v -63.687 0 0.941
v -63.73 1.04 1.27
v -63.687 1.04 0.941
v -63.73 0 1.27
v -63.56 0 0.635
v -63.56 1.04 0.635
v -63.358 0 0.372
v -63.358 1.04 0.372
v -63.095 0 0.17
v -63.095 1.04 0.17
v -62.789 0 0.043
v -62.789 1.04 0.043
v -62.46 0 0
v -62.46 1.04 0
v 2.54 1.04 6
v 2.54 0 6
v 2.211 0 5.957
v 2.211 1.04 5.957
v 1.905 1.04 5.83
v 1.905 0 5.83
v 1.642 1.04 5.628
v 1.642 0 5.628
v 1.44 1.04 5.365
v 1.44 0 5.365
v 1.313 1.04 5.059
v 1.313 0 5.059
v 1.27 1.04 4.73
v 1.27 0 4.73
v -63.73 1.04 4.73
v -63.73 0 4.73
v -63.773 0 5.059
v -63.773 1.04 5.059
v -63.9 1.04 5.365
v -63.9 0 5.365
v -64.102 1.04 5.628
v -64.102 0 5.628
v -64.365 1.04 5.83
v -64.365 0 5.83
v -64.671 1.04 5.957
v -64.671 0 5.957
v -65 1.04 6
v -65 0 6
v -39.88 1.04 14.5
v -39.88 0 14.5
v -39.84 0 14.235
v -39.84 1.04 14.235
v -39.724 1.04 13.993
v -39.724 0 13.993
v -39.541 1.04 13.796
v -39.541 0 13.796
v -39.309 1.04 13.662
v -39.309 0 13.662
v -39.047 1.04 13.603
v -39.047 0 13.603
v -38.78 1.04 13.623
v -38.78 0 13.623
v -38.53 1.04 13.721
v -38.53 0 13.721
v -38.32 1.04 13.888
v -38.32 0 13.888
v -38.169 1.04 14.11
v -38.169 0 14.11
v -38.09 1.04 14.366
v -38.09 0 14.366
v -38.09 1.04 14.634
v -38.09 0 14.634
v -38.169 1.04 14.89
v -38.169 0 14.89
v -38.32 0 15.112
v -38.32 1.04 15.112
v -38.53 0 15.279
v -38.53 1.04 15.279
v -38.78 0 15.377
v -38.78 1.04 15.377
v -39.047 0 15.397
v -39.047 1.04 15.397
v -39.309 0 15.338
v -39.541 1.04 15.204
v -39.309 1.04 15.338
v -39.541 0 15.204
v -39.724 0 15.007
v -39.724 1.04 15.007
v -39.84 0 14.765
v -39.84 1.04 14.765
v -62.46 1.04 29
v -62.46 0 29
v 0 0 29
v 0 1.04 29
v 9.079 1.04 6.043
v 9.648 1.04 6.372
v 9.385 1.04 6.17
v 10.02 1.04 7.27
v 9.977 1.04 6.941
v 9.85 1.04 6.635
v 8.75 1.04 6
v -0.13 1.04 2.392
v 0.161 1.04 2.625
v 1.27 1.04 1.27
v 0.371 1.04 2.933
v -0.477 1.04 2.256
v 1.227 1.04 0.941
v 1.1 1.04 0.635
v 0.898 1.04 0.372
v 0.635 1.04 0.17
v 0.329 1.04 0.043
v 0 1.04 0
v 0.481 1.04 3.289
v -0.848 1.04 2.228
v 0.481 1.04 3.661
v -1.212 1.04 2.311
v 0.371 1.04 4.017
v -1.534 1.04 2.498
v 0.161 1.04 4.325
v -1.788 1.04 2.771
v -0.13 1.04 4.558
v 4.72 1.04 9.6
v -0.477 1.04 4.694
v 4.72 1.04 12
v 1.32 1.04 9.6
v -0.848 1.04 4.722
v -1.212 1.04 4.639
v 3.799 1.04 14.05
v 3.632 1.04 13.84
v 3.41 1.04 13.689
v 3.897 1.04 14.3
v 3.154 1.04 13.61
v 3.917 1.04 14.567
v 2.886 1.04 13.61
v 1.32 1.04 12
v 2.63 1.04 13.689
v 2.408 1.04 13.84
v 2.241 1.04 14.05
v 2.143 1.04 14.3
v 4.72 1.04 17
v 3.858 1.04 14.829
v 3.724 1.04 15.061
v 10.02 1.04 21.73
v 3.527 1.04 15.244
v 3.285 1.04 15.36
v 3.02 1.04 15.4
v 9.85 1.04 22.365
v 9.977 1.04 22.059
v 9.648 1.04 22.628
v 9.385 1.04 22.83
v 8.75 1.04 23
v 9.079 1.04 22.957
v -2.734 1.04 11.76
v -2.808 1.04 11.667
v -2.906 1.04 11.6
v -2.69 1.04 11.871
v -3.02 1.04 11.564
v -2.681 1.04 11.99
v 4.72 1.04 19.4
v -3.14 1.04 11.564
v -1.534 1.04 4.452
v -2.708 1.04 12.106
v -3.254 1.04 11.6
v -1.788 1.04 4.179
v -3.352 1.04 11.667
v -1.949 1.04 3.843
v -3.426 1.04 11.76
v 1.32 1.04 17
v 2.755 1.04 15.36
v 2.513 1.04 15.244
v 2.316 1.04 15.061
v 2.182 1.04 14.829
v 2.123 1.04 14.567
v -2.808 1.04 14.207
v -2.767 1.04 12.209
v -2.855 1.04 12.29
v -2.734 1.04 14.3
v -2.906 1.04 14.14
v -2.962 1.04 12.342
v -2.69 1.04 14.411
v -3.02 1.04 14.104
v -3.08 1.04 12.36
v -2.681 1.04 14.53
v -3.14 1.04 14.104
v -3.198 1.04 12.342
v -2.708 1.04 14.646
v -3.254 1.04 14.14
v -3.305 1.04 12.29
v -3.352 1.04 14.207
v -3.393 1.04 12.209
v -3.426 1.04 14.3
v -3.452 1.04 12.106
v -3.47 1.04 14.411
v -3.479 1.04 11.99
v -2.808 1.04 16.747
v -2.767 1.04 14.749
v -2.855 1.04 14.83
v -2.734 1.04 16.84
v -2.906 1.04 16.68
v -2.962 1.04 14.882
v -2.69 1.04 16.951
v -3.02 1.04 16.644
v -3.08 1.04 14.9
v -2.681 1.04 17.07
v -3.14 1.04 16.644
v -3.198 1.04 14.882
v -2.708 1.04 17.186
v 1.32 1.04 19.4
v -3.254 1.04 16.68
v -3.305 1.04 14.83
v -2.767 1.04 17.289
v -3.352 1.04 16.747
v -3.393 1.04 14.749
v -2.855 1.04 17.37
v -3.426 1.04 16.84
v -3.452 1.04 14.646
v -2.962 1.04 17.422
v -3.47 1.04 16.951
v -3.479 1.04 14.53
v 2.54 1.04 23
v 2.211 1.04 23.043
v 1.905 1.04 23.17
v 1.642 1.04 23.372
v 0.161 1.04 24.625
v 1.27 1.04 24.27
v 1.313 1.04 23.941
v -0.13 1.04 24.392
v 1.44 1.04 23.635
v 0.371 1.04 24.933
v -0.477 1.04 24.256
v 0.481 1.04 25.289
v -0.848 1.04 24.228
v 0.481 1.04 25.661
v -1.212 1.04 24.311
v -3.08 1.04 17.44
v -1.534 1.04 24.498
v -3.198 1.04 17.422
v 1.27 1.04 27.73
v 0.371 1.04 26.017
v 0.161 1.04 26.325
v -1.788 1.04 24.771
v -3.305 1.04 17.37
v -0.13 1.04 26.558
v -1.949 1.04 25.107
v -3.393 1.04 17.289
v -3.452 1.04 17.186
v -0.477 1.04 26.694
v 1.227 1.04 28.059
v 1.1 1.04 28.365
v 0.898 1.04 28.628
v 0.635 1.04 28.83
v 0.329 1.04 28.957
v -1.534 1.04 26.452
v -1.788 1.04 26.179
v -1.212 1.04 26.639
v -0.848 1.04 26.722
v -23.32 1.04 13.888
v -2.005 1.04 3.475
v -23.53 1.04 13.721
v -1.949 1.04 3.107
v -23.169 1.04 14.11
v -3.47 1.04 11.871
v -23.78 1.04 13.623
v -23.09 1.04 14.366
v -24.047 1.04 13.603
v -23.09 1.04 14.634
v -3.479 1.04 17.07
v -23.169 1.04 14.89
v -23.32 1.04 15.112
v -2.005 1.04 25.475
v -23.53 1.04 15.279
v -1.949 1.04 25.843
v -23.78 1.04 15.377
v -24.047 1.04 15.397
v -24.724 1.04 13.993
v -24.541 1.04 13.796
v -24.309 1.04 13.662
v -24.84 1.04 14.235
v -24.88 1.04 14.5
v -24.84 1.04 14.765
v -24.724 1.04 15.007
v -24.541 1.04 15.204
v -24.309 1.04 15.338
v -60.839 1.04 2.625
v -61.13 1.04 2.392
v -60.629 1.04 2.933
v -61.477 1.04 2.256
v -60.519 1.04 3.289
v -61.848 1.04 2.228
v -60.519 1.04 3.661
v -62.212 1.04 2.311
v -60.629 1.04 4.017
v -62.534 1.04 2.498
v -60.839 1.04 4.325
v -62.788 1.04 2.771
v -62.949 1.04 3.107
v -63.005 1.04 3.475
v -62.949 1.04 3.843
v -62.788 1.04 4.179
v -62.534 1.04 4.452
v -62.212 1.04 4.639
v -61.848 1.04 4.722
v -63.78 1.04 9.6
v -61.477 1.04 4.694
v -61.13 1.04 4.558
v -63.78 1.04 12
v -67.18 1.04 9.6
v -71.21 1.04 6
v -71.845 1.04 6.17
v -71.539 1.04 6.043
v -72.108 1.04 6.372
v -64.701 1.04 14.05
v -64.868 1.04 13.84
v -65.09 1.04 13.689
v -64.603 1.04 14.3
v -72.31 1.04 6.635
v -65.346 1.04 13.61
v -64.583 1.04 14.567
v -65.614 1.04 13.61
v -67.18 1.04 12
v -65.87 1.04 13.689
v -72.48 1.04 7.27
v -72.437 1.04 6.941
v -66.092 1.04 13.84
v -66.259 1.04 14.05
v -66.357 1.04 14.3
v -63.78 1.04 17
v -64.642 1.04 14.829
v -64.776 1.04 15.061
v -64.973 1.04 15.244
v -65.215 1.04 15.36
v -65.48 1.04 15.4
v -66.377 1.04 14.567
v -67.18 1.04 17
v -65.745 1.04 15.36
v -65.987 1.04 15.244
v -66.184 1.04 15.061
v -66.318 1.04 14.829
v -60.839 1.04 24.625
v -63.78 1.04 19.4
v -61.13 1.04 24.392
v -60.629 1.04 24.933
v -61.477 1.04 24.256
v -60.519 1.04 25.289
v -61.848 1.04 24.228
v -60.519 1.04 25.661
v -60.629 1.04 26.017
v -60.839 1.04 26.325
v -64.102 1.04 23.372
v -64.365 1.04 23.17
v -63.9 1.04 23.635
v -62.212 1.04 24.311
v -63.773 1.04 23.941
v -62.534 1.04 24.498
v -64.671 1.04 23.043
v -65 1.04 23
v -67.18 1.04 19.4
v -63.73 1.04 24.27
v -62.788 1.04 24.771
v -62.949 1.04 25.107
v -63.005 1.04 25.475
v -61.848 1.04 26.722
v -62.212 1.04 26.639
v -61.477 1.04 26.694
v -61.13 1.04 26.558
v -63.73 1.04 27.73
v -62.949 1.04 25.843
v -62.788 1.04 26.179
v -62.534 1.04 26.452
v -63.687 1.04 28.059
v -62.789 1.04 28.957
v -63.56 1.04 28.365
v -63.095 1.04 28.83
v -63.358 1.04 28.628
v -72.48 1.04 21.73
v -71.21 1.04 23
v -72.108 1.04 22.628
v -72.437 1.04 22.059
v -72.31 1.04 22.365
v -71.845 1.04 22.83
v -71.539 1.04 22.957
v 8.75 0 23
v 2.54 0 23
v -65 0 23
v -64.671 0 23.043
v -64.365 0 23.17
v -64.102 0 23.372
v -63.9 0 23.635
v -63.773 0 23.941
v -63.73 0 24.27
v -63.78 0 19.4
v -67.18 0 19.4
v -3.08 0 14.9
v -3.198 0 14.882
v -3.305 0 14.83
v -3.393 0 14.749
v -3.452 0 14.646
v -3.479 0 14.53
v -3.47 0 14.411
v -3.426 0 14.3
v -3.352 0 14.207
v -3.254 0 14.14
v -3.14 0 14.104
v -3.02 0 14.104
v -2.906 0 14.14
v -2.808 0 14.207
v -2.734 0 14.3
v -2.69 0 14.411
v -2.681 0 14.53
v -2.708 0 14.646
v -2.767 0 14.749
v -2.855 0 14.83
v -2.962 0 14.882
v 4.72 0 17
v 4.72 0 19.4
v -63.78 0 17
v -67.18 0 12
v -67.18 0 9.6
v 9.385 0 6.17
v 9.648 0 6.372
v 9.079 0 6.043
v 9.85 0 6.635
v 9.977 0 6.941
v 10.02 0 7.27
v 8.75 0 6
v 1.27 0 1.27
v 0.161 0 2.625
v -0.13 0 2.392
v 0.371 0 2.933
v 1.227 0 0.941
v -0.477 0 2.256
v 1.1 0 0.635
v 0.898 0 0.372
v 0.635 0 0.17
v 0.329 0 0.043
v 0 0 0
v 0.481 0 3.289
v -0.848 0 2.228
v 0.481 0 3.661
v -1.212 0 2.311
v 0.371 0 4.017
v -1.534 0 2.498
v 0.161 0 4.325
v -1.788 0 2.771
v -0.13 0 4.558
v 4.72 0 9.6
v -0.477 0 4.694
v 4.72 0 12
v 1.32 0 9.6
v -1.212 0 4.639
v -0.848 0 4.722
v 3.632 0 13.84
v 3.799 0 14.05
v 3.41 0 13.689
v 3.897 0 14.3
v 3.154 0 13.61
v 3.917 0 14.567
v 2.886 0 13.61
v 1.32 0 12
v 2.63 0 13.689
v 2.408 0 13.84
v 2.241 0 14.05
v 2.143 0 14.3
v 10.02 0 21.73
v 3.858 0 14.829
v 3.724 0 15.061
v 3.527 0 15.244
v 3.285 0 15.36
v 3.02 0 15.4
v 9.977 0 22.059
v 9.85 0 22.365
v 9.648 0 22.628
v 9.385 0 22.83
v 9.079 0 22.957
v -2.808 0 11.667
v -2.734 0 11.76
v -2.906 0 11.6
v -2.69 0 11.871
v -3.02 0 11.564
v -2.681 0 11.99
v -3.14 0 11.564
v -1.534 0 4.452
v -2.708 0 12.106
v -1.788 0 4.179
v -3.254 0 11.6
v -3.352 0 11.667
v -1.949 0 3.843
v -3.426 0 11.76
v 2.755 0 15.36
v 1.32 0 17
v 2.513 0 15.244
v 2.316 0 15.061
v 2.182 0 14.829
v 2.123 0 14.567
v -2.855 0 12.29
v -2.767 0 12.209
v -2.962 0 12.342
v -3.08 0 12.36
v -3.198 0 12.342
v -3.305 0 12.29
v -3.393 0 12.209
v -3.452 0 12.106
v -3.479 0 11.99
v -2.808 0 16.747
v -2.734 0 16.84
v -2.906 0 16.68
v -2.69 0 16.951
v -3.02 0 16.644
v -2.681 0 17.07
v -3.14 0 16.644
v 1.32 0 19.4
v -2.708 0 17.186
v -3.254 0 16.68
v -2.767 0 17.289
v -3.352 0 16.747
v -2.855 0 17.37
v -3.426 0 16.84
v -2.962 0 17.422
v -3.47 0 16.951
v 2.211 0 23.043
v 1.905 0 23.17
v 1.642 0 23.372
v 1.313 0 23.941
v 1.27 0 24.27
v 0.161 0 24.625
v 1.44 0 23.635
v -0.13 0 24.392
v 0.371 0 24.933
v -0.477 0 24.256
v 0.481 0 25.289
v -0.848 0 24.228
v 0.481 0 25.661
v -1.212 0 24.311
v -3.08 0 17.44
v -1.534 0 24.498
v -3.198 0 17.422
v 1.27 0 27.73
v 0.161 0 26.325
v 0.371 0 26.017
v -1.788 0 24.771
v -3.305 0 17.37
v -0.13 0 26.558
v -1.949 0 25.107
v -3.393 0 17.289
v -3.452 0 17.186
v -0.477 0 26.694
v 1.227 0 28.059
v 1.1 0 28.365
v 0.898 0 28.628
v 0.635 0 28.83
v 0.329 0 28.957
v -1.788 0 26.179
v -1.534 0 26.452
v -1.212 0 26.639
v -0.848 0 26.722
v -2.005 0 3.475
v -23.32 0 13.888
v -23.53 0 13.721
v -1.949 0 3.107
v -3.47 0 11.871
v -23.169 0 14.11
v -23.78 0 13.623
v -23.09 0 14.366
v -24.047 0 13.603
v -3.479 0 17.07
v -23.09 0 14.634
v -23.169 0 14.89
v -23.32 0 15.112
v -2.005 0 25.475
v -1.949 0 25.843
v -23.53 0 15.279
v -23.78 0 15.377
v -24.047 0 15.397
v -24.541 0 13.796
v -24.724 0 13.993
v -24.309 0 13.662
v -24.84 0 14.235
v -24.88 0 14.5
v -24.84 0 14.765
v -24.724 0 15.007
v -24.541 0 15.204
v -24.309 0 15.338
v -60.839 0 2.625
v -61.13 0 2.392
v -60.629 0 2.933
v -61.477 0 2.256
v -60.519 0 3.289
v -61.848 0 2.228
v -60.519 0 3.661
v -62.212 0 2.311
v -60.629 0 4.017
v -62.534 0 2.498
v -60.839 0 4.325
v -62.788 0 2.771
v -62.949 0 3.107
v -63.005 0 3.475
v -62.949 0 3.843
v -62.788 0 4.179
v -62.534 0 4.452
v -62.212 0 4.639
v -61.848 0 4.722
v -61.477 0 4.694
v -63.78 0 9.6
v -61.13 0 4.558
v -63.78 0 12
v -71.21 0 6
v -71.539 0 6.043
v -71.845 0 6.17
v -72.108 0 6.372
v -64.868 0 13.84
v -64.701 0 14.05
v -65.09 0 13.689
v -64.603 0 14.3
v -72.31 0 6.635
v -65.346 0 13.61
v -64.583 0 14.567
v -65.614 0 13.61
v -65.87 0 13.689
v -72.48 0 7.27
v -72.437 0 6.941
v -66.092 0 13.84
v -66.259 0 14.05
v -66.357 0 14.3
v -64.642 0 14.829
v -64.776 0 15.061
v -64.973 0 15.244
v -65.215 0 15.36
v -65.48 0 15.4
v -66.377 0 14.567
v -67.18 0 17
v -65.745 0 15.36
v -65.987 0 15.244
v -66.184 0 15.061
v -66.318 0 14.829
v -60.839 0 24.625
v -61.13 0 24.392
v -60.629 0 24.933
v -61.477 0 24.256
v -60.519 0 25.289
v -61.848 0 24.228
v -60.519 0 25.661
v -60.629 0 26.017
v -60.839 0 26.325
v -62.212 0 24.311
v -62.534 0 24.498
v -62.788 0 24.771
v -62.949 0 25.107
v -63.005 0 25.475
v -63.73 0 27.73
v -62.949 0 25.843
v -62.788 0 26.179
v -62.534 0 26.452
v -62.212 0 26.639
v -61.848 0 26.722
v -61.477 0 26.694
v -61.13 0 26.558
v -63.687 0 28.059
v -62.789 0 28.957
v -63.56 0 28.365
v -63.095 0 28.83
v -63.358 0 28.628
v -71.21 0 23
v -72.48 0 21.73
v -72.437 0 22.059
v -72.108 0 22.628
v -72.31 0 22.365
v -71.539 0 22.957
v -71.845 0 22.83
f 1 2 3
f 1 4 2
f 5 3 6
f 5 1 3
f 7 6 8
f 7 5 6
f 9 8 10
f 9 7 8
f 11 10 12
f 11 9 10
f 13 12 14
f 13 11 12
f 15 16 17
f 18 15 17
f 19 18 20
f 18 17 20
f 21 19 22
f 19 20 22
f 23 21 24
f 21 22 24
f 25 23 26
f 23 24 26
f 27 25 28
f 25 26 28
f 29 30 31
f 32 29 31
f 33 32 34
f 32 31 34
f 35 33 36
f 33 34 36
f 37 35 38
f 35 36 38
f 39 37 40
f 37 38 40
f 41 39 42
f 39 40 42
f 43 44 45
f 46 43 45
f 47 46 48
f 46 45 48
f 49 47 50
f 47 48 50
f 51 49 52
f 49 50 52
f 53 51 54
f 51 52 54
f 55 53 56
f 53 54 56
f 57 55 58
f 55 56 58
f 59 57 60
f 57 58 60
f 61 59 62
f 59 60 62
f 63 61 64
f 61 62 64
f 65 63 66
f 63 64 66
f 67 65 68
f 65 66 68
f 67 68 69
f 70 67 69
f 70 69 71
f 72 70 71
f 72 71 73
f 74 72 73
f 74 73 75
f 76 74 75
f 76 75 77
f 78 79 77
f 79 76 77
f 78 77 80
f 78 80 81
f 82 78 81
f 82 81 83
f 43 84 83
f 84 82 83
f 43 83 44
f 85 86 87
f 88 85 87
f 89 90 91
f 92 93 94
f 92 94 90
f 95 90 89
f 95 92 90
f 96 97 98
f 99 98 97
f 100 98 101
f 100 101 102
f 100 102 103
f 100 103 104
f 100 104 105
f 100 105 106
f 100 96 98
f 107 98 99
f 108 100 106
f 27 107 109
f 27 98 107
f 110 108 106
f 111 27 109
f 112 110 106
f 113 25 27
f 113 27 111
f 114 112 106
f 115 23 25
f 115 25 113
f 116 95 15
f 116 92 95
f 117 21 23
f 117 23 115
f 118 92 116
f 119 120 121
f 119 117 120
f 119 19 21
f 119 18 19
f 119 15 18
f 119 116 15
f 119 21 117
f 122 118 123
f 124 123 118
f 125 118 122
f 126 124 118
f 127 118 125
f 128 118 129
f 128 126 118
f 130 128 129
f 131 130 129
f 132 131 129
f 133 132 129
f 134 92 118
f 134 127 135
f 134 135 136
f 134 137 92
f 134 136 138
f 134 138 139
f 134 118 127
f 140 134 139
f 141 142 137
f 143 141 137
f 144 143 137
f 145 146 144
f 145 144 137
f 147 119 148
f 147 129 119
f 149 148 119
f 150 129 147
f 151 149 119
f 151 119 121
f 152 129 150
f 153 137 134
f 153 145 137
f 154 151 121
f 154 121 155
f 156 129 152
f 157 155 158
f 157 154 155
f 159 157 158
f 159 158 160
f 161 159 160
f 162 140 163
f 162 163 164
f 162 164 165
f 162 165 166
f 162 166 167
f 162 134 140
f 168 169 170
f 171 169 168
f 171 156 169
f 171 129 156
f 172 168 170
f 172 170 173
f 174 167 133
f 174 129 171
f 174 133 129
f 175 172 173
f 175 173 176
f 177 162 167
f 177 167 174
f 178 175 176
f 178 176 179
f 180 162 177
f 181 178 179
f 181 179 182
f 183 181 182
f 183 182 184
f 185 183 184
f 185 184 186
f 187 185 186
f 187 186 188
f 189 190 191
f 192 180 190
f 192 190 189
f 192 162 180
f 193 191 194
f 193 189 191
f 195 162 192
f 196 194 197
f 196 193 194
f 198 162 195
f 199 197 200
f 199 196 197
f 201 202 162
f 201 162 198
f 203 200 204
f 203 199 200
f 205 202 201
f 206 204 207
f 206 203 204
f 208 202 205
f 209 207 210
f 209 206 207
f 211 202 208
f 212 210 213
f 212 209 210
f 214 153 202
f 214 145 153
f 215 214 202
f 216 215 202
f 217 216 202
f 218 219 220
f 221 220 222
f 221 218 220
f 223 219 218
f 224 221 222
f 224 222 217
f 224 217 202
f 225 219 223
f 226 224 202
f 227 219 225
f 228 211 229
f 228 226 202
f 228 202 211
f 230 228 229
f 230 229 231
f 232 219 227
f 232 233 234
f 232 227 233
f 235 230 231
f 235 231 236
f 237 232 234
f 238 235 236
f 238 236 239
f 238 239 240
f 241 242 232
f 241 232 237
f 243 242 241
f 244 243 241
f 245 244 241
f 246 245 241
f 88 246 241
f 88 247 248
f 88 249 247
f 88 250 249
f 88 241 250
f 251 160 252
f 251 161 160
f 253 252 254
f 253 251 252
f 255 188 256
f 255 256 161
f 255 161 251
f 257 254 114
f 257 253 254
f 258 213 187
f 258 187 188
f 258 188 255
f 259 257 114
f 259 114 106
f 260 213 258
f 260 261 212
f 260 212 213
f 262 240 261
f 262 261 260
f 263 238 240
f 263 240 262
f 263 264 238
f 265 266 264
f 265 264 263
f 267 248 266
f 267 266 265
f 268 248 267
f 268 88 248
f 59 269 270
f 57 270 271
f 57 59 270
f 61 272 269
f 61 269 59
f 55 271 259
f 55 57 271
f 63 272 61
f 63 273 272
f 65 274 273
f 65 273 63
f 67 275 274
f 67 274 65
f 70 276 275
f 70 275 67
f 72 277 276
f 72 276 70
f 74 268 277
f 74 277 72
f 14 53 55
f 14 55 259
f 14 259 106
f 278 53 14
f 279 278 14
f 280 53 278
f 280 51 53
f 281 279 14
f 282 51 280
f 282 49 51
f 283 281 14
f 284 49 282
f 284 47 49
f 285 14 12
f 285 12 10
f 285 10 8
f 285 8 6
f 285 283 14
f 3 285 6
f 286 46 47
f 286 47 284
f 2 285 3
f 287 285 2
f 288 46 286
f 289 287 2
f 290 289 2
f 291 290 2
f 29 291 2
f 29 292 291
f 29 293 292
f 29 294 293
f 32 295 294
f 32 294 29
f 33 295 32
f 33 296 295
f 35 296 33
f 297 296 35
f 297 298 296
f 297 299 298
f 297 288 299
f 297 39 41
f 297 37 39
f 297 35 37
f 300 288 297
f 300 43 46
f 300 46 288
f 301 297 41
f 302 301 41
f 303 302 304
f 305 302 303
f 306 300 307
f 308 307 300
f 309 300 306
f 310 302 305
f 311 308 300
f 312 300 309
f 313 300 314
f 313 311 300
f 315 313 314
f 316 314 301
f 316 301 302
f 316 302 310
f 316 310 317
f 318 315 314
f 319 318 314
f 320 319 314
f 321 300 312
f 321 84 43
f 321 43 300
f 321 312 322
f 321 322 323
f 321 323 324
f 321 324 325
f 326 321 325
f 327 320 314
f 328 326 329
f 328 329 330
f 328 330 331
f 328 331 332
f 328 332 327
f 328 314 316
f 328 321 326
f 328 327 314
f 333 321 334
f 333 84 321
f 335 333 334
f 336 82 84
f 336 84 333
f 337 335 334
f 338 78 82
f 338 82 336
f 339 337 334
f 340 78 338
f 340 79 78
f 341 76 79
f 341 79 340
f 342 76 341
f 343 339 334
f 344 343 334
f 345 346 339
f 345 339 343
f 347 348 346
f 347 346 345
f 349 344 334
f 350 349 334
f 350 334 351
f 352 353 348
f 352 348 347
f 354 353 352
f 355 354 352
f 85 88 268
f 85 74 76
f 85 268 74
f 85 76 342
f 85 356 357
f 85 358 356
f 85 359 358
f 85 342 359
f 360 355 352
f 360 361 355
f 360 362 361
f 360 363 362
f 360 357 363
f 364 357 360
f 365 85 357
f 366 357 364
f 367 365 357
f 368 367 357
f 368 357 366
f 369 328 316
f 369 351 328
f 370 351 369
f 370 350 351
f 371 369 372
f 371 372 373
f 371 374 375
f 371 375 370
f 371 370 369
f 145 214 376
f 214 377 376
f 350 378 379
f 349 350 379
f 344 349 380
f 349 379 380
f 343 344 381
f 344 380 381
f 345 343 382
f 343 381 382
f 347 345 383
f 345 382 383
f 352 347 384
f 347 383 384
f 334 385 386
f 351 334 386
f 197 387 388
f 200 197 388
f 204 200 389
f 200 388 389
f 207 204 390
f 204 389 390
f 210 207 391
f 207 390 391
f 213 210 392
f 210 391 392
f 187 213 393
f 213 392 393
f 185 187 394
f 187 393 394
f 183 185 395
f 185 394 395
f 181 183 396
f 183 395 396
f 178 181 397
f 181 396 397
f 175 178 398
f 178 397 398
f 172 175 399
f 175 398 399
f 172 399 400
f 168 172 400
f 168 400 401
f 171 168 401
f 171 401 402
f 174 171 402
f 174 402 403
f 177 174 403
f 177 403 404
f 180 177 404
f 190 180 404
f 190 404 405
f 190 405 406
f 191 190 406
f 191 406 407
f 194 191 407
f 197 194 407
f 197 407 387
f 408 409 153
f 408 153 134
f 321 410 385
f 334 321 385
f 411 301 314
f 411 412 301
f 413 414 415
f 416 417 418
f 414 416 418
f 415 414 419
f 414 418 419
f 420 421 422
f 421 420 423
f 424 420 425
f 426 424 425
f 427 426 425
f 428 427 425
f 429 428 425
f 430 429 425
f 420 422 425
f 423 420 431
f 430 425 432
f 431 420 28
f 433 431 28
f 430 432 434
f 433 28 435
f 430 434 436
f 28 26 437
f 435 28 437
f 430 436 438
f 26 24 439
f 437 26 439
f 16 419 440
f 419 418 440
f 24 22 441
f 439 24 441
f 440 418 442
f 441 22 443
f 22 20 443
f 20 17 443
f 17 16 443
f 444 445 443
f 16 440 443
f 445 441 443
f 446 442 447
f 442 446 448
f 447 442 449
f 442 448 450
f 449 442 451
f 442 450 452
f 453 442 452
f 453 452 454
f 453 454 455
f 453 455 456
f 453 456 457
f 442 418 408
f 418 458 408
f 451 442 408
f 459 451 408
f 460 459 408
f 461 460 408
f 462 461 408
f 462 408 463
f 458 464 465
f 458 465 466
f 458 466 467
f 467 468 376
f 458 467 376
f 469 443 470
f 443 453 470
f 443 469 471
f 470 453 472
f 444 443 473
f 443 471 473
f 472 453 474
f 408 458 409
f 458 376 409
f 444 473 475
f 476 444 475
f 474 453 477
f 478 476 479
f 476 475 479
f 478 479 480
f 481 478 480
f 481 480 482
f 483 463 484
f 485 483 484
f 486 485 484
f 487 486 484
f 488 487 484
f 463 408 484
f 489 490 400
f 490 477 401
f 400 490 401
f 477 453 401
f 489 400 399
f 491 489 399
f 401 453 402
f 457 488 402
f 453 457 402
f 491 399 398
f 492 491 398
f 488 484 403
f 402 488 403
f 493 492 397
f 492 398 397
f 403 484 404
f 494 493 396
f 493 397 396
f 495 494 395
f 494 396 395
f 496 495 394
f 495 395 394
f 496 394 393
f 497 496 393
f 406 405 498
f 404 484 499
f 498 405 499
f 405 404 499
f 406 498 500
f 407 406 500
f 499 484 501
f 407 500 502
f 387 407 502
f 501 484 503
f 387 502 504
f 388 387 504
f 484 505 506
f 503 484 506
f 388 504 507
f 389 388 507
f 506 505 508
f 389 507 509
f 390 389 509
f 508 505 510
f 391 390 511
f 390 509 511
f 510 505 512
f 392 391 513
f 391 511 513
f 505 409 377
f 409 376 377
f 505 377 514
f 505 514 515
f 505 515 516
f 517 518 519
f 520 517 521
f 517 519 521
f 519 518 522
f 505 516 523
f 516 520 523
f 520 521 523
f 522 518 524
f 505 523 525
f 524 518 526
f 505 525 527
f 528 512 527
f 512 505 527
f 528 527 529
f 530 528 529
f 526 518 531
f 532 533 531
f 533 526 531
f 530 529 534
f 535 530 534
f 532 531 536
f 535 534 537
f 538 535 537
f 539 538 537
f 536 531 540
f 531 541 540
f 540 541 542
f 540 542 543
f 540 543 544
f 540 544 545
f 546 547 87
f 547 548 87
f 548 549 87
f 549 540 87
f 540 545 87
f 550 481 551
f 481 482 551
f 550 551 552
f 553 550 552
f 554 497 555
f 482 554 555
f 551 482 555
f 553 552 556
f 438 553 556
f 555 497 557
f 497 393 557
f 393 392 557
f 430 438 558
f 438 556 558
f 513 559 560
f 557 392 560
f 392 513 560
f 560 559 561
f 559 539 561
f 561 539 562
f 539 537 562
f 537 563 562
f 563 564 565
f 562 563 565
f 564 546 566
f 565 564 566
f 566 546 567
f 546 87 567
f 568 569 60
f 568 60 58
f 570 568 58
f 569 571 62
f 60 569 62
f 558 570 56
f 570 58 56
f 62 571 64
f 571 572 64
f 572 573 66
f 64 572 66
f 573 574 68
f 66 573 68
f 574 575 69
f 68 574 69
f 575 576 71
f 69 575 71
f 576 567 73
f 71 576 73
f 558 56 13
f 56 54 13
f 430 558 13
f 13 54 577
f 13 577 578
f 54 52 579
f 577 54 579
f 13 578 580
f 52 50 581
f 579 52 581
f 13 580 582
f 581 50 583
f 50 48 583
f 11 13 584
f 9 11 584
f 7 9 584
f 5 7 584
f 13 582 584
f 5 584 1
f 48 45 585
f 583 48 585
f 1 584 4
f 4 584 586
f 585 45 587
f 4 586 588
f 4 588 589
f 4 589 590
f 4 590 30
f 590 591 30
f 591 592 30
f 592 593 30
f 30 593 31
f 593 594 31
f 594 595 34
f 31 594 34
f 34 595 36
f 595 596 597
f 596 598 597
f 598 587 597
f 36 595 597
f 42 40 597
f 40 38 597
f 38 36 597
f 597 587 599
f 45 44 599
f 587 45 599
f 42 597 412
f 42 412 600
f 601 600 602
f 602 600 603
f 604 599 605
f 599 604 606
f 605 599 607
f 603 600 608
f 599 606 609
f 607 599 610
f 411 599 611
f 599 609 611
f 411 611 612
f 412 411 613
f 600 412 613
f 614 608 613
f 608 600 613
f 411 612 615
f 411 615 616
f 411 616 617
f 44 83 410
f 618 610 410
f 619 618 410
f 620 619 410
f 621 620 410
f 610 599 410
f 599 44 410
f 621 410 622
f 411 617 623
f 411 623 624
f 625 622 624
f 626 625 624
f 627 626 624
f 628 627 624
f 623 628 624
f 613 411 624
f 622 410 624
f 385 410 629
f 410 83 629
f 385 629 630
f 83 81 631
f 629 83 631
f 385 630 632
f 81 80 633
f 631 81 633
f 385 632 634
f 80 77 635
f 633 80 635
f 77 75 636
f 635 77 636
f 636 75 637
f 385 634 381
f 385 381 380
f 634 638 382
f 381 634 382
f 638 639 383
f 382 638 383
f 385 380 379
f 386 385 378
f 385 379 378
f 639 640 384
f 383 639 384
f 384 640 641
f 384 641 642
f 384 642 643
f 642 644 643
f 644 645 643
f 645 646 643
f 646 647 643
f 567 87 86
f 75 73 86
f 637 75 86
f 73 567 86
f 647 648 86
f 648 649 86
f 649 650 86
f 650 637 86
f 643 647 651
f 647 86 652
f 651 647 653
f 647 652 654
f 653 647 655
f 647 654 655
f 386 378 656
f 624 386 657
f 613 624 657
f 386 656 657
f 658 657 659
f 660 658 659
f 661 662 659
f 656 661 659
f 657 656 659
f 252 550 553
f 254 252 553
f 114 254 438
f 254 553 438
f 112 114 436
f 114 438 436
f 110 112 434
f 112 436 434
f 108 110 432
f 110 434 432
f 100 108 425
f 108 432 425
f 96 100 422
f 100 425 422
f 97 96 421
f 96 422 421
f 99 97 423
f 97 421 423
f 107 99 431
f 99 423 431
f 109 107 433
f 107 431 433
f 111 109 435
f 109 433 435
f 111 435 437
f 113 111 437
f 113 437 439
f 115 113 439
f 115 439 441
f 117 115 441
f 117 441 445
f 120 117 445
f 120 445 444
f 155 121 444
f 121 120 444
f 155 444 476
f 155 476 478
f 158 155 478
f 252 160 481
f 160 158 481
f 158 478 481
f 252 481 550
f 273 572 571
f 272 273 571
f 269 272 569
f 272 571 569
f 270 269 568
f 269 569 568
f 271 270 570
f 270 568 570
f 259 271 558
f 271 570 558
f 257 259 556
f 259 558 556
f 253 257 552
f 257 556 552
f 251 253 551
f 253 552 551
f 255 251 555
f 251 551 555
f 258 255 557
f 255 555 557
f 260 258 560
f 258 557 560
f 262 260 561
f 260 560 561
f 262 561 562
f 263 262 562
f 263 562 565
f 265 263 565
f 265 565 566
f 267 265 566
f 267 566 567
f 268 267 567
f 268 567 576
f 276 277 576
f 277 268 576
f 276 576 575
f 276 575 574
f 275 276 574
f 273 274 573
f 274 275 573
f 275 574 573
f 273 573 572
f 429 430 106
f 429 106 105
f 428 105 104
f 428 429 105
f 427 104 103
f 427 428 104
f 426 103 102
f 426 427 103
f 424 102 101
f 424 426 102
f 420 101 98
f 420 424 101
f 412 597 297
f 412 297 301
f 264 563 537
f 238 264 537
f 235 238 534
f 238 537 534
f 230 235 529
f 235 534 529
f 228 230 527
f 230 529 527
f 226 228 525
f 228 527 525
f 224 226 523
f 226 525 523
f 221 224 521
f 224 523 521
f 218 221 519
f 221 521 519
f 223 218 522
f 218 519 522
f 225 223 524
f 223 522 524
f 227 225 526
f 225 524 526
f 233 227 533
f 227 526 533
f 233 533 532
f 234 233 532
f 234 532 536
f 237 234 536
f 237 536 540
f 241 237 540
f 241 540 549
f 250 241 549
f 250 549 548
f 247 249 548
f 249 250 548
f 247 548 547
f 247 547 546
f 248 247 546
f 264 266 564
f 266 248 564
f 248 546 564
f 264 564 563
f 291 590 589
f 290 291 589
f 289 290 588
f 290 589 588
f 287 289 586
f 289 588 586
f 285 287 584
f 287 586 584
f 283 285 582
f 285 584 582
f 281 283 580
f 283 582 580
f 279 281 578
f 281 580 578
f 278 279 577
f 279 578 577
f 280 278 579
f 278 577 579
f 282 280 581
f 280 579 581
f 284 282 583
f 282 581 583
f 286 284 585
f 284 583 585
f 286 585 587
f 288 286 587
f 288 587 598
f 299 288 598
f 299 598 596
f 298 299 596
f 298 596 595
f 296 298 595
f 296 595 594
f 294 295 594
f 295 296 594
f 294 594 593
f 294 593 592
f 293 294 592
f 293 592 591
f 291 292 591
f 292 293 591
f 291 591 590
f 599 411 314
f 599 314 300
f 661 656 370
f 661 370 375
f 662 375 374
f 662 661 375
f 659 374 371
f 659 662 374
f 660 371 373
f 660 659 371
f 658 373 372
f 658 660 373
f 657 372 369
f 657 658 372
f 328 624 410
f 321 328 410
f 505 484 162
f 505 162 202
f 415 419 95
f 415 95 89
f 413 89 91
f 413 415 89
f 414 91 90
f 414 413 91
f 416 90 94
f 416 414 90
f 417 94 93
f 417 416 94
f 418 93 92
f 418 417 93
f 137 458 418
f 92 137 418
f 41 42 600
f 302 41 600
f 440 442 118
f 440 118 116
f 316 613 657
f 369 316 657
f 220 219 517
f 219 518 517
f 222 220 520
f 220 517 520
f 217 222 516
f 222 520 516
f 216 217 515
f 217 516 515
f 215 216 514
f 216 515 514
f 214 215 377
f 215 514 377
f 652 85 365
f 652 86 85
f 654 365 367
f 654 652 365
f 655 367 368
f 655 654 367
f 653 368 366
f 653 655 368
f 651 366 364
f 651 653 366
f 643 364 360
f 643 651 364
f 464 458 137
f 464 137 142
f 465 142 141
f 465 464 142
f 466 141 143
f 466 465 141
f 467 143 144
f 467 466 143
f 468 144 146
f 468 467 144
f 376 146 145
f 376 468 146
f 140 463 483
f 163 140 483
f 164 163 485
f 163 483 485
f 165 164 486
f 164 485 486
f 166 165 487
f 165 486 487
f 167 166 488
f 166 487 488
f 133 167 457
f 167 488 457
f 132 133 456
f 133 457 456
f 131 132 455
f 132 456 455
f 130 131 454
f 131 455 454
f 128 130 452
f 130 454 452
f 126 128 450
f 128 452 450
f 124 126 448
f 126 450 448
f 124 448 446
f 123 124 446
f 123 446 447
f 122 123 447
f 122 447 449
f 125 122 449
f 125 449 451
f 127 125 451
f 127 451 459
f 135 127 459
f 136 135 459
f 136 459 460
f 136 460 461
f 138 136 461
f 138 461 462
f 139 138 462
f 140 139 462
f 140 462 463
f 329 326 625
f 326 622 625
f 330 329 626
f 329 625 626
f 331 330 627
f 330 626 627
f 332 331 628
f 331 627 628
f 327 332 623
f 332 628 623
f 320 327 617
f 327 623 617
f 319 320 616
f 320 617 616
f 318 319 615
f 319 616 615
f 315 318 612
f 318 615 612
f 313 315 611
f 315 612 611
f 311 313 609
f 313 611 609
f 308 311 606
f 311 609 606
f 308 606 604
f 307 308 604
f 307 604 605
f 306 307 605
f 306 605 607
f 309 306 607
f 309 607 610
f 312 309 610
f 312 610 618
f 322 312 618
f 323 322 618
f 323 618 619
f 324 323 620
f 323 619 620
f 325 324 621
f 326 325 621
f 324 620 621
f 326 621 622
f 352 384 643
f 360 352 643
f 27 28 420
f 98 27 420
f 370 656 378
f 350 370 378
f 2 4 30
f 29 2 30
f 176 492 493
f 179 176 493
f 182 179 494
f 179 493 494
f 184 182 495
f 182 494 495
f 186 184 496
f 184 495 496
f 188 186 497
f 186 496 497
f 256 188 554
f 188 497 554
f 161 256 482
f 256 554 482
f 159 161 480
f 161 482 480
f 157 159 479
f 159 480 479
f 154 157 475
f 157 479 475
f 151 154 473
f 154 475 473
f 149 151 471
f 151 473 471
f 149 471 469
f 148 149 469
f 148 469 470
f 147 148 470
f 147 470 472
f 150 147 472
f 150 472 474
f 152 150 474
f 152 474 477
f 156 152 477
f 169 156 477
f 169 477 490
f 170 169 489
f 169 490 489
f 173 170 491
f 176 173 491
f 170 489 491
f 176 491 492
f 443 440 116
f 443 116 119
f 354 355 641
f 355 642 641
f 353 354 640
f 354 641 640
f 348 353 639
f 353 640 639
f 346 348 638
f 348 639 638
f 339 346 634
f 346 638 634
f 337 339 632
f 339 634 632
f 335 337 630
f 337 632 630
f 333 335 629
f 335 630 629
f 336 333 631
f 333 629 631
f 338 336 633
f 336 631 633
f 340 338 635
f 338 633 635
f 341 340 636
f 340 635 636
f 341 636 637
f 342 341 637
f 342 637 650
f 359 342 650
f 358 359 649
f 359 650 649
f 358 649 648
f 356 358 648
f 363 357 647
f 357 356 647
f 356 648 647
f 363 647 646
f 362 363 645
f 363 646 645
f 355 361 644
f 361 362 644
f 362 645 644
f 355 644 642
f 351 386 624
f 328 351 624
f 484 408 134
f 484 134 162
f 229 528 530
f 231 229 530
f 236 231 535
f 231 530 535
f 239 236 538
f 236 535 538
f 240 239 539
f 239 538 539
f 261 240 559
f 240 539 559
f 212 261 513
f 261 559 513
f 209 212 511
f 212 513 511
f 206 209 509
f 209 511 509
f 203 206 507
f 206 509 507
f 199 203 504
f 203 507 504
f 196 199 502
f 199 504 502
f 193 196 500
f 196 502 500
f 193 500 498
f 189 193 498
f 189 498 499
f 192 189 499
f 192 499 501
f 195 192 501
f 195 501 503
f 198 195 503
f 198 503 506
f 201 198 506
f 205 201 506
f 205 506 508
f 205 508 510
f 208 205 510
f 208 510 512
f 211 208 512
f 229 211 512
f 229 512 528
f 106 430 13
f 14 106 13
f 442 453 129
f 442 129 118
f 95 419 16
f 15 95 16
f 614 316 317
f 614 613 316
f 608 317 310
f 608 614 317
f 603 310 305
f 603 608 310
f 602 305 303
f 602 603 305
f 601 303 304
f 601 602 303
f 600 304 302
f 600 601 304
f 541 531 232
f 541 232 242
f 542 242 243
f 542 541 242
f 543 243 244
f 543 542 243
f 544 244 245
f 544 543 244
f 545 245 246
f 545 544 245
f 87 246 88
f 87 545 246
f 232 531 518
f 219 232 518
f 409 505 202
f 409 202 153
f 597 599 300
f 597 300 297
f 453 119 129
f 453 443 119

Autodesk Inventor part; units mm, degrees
ref_plane "YZ Plane" through (0, 0, 0) normal (1, 0, 0) x (0, 1, 0)
ref_plane "XZ Plane" through (0, 0, 0) normal (0, 1, 0) x (-1, 0, 0)
ref_plane "XY Plane" through (0, 0, 0) normal (0, 0, 1) x (1, 0, 0)
sketch "Boceto1" plane through (0, 0, 0) normal (0, 1, 0) x (-1, 0, 0)
  arc A0 (-10.02, 7.27) -> (-8.75, 6) centre (-8.75, 7.27) ccw
  line L0 (-8.75, 6) -> (-2.54, 6)
  arc A1 (-1.27, 4.73) -> (-2.54, 6) centre (-2.54, 4.73) ccw
  line L1 (-1.27, 4.73) -> (-1.27, 1.27)
  arc A2 (-1.27, 1.27) -> (0, 0) centre (0, 1.27) ccw
  line L2 (0, 0) -> (62.46, 0)
  arc A3 (62.46, 0) -> (63.73, 1.27) centre (62.46, 1.27) ccw
  line L3 (63.73, 1.27) -> (63.73, 4.73)
  arc A4 (65, 6) -> (63.73, 4.73) centre (65, 4.73) ccw
  line L4 (65, 6) -> (71.21, 6)
  arc A5 (71.21, 6) -> (72.48, 7.27) centre (71.21, 7.27) ccw
  line L5 (72.48, 7.27) -> (72.48, 21.73)
  arc A6 (72.48, 21.73) -> (71.21, 23) centre (71.21, 21.73) ccw
  line L6 (71.21, 23) -> (65, 23)
  arc A7 (63.73, 24.27) -> (65, 23) centre (65, 24.27) ccw
  line L7 (63.73, 24.27) -> (63.73, 27.73)
  arc A8 (63.73, 27.73) -> (62.46, 29) centre (62.46, 27.73) ccw
  line L8 (62.46, 29) -> (0, 29)
  arc A9 (0, 29) -> (-1.27, 27.73) centre (0, 27.73) ccw
  line L9 (-1.27, 27.73) -> (-1.27, 24.27)
  arc A10 (-2.54, 23) -> (-1.27, 24.27) centre (-2.54, 24.27) ccw
  line L10 (-2.54, 23) -> (-8.75, 23)
  arc A11 (-8.75, 23) -> (-10.02, 21.73) centre (-8.75, 21.73) ccw
  line L11 (-10.02, 21.73) -> (-10.02, 7.27)
  circle A12 centre (61.755, 25.475) radius 1.25
  circle A13 centre (0.755, 3.475) radius 1.25
  circle A14 centre (0.755, 25.475) radius 1.25
  circle A15 centre (61.755, 3.475) radius 1.25
  circle A16 centre (38.98, 14.5) radius 0.9
  circle A17 centre (23.98, 14.5) radius 0.9
  point P0 (0, 0)
extrude "Extrusión1" add sketch "Boceto1" along normal blind 1.04
sketch "Boceto2" plane through (0, 1.04, 0) normal (0, 1, 0) x (1, 0, 0)
  circle A0 centre (-65.48, -14.5) radius 0.9
  circle A1 centre (3.02, -14.5) radius 0.9
  line L0 (-71.21, -23) -> (-65, -23) projected
  line L1 (-72.48, -7.27) -> (-72.48, -21.73) projected
  line L2 (2.54, -23) -> (8.75, -23) projected
  line L3 (10.02, -21.73) -> (10.02, -7.27) projected
  point P0 (0, 0)
  dimension "d2" = 1.8
  dimension "d3" = 1.8
  dimension "d4" = 8.5
  dimension "d5" = 7
  dimension "d6" = 8.5
  dimension "d7" = 7
hole "Agujero1" at (-65.48, 1.04, 14.5) at (3.02, 1.04, 14.5) direction (0, -1, 0) diameter 1.8 end through all
sketch "Boceto3" plane through (0, 1.04, 0) normal (0, 1, 0) x (1, 0, 0)
  circle A0 centre (-3.08, -11.96) radius 0.4
  line L0 (0, 0) -> (-62.46, 0) projected
  line L1 (10.02, -21.73) -> (10.02, -7.27) projected
  circle A1 centre (-3.08, -14.5) radius 0.4
  circle A2 centre (-3.08, -17.04) radius 0.4
  line L2 (-62.46, -29) -> (0, -29) projected
  line L3 (1.27, -27.73) -> (1.27, -24.27) projected
  dimension "d23" = 0.8
  dimension "d24" = 11.96
  dimension "d25" = 13.1
  dimension "d26" = 0.8
  dimension "d27" = 0.8
  dimension "d28" = 13.1
  dimension "d29" = 13.1
  dimension "d30" = 11.96
  dimension "d31" = 2.54
  dimension "d32" = 2.54
  dimension "d40" = 4.35
hole "Agujero2" at (-3.08, 1.04, 11.96) at (-3.08, 1.04, 14.5) at (-3.08, 1.04, 17.04) direction (0, -1, 0) diameter 0.8 end through all
sketch "Boceto4" plane through (0, 0, 0) normal (0, -1, 0) x (1, 0, 0)
  line L0 (4.72, 9.6) -> (1.32, 9.6)
  line L1 (1.32, 9.6) -> (1.32, 12)
  line L2 (1.32, 12) -> (4.72, 12)
  line L3 (4.72, 12) -> (4.72, 9.6)
  line L4 (4.72, 17) -> (1.32, 17)
  line L5 (1.32, 17) -> (1.32, 19.4)
  line L6 (1.32, 19.4) -> (4.72, 19.4)
  line L7 (4.72, 19.4) -> (4.72, 17)
  line L8 (10.02, 21.73) -> (10.02, 7.27) projected
  line L9 (2.54, 23) -> (8.75, 23) projected
  line L10 (8.75, 6) -> (2.54, 6) projected
  line L11 (-63.78, 19.4) -> (-67.18, 19.4)
  line L12 (-67.18, 19.4) -> (-67.18, 17)
  line L13 (-67.18, 17) -> (-63.78, 17)
  line L14 (-63.78, 17) -> (-63.78, 19.4)
  line L15 (-71.21, 23) -> (-65, 23) projected
  line L16 (-72.48, 7.27) -> (-72.48, 21.73) projected
  line L17 (-63.78, 9.6) -> (-67.18, 9.6)
  line L18 (-67.18, 9.6) -> (-67.18, 12)
  line L19 (-67.18, 12) -> (-63.78, 12)
  line L20 (-63.78, 12) -> (-63.78, 9.6)
  line L21 (-65, 6) -> (-71.21, 6) projected
  point P0 (0, 0)
  dimension "d41" = 3.4
  dimension "d42" = 2.4
  dimension "d43" = 3.4
  dimension "d44" = 2.4
  dimension "d45" = 5.3
  dimension "d46" = 3.6
  dimension "d47" = 3.6
  dimension "d48" = 3.4
  dimension "d49" = 2.4
  dimension "d50" = 3.6
  dimension "d51" = 5.3
  dimension "d52" = 3.6
  dimension "d53" = 5.3
extrude "Extrusión2" cut sketch "Boceto4" against normal through all
properties part number "Interstage B1"
